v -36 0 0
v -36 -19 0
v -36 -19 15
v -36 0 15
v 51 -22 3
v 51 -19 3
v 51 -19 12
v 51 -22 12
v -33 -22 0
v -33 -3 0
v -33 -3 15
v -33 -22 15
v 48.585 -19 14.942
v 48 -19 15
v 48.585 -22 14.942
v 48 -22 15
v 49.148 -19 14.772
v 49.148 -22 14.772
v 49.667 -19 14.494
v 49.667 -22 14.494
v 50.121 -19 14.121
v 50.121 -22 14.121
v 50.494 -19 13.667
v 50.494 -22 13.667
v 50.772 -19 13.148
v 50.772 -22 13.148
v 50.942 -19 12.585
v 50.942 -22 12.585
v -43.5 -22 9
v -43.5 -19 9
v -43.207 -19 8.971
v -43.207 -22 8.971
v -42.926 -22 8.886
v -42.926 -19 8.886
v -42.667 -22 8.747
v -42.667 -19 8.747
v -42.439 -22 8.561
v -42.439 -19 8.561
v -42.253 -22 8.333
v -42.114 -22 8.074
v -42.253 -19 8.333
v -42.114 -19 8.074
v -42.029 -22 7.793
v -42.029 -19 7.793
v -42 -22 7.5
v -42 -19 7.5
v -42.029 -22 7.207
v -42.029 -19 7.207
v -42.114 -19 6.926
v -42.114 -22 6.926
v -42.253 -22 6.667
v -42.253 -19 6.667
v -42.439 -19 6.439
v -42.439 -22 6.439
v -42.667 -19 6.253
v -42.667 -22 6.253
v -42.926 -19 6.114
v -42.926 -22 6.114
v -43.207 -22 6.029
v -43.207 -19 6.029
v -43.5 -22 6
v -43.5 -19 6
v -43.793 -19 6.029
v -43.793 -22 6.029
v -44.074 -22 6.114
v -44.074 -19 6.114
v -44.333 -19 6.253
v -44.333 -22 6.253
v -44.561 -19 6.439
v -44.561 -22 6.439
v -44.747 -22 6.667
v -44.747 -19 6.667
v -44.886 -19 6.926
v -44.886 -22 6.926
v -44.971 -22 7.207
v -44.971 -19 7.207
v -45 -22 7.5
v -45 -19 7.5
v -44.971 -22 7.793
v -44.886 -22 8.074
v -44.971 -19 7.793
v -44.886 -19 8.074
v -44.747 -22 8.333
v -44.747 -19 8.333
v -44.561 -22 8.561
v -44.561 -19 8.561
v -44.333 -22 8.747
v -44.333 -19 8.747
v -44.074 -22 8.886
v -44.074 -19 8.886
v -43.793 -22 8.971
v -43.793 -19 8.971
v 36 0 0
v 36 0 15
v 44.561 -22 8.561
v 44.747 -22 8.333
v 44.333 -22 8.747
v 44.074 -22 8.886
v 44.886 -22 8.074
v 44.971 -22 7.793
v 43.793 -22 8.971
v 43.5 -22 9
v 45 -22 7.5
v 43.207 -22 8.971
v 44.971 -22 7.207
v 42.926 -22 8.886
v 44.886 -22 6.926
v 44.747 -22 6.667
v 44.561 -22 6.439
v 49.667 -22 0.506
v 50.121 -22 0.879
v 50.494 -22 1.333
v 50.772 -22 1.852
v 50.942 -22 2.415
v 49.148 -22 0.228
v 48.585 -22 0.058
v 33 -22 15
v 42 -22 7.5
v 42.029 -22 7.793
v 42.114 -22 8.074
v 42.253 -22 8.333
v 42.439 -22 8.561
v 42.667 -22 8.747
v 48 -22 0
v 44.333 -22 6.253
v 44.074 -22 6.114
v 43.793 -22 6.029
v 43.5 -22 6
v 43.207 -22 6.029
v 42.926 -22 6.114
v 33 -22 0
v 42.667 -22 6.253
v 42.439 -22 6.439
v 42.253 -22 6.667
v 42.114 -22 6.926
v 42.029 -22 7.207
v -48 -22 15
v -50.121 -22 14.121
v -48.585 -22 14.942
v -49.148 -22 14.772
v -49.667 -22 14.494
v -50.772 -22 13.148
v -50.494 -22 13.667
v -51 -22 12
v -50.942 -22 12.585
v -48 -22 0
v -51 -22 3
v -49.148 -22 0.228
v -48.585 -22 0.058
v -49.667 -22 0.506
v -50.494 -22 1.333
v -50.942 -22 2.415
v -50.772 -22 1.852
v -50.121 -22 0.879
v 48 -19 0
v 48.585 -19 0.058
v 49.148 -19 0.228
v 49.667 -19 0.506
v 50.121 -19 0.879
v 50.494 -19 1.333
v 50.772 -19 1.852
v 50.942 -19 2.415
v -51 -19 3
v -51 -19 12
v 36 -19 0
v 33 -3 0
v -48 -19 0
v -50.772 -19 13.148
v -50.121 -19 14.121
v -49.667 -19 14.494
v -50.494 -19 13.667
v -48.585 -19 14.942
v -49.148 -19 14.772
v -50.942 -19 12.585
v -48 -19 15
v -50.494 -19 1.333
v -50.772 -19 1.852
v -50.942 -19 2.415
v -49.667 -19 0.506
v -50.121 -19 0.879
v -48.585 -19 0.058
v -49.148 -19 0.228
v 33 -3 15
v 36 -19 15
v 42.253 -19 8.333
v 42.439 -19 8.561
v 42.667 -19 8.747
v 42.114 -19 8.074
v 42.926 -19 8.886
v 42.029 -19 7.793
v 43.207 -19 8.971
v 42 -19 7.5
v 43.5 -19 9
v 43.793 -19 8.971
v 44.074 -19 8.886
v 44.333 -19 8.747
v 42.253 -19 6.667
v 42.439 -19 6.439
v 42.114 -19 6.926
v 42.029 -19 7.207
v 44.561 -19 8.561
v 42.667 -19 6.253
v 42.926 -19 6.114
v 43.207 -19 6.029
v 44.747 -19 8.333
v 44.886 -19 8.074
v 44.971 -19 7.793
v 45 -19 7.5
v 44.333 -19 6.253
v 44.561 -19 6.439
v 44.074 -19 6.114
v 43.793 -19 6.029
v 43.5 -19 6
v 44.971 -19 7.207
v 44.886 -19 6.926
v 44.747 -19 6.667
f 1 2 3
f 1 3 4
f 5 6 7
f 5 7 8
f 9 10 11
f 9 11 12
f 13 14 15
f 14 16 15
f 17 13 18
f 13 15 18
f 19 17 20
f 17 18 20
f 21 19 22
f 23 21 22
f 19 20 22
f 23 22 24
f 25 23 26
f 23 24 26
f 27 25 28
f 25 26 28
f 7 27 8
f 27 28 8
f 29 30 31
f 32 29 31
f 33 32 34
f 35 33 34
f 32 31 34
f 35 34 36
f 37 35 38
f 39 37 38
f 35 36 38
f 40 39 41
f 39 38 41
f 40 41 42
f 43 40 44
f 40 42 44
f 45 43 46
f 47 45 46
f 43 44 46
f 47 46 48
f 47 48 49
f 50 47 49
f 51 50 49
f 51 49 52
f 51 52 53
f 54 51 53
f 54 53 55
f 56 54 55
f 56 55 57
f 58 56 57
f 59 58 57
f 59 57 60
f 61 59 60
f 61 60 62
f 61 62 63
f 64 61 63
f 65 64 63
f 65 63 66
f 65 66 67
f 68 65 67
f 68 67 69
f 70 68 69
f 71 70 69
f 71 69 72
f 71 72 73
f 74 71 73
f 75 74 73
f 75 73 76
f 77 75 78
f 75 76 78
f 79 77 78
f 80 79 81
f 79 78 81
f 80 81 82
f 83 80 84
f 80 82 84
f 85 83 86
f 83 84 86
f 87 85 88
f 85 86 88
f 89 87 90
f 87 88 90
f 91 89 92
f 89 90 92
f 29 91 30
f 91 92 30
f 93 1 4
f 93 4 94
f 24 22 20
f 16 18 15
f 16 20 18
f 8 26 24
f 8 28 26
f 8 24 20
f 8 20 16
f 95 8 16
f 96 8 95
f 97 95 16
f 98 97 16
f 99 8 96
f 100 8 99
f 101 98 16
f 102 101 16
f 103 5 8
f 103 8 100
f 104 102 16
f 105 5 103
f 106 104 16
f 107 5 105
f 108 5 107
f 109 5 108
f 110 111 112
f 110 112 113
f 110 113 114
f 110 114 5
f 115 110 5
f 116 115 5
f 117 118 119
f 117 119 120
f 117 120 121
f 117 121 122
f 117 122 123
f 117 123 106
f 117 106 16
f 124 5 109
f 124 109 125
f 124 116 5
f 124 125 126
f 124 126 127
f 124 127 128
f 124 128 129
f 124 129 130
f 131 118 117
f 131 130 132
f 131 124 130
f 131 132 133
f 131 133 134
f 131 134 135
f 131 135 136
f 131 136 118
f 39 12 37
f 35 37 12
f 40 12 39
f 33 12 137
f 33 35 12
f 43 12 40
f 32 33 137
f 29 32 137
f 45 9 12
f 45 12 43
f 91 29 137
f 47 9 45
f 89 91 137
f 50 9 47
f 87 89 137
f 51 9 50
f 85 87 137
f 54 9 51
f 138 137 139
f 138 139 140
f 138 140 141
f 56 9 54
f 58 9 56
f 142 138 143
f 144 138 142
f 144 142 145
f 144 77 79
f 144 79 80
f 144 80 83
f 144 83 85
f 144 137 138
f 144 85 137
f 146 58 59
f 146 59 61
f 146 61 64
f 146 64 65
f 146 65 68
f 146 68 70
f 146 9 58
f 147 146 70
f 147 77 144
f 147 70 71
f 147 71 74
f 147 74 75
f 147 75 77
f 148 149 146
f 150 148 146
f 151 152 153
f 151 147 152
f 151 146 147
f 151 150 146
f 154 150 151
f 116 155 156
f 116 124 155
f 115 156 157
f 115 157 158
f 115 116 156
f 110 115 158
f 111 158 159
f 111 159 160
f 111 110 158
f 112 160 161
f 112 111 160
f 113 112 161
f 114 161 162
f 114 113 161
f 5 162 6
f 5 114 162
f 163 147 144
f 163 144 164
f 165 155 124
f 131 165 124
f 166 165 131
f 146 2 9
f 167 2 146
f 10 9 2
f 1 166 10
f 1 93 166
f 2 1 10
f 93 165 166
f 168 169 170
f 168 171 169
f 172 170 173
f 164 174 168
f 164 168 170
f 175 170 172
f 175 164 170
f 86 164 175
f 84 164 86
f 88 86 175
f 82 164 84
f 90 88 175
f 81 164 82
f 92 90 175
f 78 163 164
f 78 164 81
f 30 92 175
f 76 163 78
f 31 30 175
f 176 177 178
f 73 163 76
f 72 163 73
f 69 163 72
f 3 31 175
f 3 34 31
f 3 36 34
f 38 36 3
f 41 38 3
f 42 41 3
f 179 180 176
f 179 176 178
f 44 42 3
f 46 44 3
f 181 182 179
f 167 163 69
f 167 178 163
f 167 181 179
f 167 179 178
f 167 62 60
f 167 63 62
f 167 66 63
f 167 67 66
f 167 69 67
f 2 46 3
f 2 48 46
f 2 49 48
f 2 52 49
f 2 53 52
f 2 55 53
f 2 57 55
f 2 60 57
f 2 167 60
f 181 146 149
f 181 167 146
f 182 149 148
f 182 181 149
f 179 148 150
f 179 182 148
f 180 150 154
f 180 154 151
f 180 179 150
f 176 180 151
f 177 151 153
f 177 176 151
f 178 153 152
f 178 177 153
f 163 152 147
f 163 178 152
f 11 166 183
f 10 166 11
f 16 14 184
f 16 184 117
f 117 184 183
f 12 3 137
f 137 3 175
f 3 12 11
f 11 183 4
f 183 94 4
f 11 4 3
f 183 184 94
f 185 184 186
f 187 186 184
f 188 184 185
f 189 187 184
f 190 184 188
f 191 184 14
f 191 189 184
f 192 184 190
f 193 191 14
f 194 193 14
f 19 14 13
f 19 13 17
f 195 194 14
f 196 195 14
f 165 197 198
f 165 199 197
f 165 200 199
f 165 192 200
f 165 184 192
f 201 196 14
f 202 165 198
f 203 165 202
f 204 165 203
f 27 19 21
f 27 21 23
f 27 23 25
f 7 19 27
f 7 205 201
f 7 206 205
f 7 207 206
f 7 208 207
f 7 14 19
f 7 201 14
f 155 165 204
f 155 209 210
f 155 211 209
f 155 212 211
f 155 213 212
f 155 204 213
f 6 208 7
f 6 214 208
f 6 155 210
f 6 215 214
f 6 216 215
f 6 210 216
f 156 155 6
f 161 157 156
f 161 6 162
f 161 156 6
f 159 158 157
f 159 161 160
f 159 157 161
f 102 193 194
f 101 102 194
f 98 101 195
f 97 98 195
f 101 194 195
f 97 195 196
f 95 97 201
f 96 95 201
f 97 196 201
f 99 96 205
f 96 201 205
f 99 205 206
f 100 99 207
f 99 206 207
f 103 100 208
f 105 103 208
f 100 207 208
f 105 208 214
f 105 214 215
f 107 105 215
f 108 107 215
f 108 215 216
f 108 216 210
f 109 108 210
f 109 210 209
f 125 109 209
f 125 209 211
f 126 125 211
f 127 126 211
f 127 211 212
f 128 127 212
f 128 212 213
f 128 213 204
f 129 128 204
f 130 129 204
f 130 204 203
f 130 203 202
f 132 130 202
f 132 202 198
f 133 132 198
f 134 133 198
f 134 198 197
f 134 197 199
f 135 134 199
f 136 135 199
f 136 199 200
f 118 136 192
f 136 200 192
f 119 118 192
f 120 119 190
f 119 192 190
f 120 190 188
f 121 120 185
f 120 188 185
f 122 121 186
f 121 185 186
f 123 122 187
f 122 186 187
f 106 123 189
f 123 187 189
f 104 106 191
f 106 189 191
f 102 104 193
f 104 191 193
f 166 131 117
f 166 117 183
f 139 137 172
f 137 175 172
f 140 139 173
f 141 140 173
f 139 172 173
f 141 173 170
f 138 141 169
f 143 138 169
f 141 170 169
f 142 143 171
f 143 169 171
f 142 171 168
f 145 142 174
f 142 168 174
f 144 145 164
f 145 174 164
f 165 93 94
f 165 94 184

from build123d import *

# Parameters (mm, degrees)
EXTRUDE_1_DEPTH     = 15
SKETCH_2_R          = 1.5
CUT_EXTRUDE_1_DEPTH = 20
FILLET_1_R          = 3


with BuildPart() as part:
    # 草图1 → 凸台-拉伸1 (new body)
    with BuildSketch(Plane.XY):
        Polygon((-36, 0), (36, 0), (36, -19), (51, -19), (51, -22), (33, -22), (33, -3), (-33, -3), (-33, -22), (-51, -22), (-51, -19), (-36, -19), align=None)
    extrude(amount=EXTRUDE_1_DEPTH)

    # 草图2 → 切除-拉伸1 (cut)
    with BuildSketch(Plane(origin=(0, -19, 0), x_dir=(1, 0, 0), z_dir=(0, 1, 0))):
        with Locations(Location((-43.5, -7.5, 0), (0, 0, 270))):
            Circle(SKETCH_2_R)
        with Locations(Location((43.5, -7.5, 0), (0, 0, 270))):
            Circle(SKETCH_2_R)
    extrude(amount=-CUT_EXTRUDE_1_DEPTH, mode=Mode.SUBTRACT)

    # 圆角1
    fillet_1_edges = [part.edges().sort_by_distance(p)[0] for p in [
        (-51, -20.5, 15),
        (51, -20.5, 0),
        (-51, -20.5, 0),
        (51, -20.5, 15),
    ]]
    fillet(fillet_1_edges, radius=FILLET_1_R)


solid = part.part
